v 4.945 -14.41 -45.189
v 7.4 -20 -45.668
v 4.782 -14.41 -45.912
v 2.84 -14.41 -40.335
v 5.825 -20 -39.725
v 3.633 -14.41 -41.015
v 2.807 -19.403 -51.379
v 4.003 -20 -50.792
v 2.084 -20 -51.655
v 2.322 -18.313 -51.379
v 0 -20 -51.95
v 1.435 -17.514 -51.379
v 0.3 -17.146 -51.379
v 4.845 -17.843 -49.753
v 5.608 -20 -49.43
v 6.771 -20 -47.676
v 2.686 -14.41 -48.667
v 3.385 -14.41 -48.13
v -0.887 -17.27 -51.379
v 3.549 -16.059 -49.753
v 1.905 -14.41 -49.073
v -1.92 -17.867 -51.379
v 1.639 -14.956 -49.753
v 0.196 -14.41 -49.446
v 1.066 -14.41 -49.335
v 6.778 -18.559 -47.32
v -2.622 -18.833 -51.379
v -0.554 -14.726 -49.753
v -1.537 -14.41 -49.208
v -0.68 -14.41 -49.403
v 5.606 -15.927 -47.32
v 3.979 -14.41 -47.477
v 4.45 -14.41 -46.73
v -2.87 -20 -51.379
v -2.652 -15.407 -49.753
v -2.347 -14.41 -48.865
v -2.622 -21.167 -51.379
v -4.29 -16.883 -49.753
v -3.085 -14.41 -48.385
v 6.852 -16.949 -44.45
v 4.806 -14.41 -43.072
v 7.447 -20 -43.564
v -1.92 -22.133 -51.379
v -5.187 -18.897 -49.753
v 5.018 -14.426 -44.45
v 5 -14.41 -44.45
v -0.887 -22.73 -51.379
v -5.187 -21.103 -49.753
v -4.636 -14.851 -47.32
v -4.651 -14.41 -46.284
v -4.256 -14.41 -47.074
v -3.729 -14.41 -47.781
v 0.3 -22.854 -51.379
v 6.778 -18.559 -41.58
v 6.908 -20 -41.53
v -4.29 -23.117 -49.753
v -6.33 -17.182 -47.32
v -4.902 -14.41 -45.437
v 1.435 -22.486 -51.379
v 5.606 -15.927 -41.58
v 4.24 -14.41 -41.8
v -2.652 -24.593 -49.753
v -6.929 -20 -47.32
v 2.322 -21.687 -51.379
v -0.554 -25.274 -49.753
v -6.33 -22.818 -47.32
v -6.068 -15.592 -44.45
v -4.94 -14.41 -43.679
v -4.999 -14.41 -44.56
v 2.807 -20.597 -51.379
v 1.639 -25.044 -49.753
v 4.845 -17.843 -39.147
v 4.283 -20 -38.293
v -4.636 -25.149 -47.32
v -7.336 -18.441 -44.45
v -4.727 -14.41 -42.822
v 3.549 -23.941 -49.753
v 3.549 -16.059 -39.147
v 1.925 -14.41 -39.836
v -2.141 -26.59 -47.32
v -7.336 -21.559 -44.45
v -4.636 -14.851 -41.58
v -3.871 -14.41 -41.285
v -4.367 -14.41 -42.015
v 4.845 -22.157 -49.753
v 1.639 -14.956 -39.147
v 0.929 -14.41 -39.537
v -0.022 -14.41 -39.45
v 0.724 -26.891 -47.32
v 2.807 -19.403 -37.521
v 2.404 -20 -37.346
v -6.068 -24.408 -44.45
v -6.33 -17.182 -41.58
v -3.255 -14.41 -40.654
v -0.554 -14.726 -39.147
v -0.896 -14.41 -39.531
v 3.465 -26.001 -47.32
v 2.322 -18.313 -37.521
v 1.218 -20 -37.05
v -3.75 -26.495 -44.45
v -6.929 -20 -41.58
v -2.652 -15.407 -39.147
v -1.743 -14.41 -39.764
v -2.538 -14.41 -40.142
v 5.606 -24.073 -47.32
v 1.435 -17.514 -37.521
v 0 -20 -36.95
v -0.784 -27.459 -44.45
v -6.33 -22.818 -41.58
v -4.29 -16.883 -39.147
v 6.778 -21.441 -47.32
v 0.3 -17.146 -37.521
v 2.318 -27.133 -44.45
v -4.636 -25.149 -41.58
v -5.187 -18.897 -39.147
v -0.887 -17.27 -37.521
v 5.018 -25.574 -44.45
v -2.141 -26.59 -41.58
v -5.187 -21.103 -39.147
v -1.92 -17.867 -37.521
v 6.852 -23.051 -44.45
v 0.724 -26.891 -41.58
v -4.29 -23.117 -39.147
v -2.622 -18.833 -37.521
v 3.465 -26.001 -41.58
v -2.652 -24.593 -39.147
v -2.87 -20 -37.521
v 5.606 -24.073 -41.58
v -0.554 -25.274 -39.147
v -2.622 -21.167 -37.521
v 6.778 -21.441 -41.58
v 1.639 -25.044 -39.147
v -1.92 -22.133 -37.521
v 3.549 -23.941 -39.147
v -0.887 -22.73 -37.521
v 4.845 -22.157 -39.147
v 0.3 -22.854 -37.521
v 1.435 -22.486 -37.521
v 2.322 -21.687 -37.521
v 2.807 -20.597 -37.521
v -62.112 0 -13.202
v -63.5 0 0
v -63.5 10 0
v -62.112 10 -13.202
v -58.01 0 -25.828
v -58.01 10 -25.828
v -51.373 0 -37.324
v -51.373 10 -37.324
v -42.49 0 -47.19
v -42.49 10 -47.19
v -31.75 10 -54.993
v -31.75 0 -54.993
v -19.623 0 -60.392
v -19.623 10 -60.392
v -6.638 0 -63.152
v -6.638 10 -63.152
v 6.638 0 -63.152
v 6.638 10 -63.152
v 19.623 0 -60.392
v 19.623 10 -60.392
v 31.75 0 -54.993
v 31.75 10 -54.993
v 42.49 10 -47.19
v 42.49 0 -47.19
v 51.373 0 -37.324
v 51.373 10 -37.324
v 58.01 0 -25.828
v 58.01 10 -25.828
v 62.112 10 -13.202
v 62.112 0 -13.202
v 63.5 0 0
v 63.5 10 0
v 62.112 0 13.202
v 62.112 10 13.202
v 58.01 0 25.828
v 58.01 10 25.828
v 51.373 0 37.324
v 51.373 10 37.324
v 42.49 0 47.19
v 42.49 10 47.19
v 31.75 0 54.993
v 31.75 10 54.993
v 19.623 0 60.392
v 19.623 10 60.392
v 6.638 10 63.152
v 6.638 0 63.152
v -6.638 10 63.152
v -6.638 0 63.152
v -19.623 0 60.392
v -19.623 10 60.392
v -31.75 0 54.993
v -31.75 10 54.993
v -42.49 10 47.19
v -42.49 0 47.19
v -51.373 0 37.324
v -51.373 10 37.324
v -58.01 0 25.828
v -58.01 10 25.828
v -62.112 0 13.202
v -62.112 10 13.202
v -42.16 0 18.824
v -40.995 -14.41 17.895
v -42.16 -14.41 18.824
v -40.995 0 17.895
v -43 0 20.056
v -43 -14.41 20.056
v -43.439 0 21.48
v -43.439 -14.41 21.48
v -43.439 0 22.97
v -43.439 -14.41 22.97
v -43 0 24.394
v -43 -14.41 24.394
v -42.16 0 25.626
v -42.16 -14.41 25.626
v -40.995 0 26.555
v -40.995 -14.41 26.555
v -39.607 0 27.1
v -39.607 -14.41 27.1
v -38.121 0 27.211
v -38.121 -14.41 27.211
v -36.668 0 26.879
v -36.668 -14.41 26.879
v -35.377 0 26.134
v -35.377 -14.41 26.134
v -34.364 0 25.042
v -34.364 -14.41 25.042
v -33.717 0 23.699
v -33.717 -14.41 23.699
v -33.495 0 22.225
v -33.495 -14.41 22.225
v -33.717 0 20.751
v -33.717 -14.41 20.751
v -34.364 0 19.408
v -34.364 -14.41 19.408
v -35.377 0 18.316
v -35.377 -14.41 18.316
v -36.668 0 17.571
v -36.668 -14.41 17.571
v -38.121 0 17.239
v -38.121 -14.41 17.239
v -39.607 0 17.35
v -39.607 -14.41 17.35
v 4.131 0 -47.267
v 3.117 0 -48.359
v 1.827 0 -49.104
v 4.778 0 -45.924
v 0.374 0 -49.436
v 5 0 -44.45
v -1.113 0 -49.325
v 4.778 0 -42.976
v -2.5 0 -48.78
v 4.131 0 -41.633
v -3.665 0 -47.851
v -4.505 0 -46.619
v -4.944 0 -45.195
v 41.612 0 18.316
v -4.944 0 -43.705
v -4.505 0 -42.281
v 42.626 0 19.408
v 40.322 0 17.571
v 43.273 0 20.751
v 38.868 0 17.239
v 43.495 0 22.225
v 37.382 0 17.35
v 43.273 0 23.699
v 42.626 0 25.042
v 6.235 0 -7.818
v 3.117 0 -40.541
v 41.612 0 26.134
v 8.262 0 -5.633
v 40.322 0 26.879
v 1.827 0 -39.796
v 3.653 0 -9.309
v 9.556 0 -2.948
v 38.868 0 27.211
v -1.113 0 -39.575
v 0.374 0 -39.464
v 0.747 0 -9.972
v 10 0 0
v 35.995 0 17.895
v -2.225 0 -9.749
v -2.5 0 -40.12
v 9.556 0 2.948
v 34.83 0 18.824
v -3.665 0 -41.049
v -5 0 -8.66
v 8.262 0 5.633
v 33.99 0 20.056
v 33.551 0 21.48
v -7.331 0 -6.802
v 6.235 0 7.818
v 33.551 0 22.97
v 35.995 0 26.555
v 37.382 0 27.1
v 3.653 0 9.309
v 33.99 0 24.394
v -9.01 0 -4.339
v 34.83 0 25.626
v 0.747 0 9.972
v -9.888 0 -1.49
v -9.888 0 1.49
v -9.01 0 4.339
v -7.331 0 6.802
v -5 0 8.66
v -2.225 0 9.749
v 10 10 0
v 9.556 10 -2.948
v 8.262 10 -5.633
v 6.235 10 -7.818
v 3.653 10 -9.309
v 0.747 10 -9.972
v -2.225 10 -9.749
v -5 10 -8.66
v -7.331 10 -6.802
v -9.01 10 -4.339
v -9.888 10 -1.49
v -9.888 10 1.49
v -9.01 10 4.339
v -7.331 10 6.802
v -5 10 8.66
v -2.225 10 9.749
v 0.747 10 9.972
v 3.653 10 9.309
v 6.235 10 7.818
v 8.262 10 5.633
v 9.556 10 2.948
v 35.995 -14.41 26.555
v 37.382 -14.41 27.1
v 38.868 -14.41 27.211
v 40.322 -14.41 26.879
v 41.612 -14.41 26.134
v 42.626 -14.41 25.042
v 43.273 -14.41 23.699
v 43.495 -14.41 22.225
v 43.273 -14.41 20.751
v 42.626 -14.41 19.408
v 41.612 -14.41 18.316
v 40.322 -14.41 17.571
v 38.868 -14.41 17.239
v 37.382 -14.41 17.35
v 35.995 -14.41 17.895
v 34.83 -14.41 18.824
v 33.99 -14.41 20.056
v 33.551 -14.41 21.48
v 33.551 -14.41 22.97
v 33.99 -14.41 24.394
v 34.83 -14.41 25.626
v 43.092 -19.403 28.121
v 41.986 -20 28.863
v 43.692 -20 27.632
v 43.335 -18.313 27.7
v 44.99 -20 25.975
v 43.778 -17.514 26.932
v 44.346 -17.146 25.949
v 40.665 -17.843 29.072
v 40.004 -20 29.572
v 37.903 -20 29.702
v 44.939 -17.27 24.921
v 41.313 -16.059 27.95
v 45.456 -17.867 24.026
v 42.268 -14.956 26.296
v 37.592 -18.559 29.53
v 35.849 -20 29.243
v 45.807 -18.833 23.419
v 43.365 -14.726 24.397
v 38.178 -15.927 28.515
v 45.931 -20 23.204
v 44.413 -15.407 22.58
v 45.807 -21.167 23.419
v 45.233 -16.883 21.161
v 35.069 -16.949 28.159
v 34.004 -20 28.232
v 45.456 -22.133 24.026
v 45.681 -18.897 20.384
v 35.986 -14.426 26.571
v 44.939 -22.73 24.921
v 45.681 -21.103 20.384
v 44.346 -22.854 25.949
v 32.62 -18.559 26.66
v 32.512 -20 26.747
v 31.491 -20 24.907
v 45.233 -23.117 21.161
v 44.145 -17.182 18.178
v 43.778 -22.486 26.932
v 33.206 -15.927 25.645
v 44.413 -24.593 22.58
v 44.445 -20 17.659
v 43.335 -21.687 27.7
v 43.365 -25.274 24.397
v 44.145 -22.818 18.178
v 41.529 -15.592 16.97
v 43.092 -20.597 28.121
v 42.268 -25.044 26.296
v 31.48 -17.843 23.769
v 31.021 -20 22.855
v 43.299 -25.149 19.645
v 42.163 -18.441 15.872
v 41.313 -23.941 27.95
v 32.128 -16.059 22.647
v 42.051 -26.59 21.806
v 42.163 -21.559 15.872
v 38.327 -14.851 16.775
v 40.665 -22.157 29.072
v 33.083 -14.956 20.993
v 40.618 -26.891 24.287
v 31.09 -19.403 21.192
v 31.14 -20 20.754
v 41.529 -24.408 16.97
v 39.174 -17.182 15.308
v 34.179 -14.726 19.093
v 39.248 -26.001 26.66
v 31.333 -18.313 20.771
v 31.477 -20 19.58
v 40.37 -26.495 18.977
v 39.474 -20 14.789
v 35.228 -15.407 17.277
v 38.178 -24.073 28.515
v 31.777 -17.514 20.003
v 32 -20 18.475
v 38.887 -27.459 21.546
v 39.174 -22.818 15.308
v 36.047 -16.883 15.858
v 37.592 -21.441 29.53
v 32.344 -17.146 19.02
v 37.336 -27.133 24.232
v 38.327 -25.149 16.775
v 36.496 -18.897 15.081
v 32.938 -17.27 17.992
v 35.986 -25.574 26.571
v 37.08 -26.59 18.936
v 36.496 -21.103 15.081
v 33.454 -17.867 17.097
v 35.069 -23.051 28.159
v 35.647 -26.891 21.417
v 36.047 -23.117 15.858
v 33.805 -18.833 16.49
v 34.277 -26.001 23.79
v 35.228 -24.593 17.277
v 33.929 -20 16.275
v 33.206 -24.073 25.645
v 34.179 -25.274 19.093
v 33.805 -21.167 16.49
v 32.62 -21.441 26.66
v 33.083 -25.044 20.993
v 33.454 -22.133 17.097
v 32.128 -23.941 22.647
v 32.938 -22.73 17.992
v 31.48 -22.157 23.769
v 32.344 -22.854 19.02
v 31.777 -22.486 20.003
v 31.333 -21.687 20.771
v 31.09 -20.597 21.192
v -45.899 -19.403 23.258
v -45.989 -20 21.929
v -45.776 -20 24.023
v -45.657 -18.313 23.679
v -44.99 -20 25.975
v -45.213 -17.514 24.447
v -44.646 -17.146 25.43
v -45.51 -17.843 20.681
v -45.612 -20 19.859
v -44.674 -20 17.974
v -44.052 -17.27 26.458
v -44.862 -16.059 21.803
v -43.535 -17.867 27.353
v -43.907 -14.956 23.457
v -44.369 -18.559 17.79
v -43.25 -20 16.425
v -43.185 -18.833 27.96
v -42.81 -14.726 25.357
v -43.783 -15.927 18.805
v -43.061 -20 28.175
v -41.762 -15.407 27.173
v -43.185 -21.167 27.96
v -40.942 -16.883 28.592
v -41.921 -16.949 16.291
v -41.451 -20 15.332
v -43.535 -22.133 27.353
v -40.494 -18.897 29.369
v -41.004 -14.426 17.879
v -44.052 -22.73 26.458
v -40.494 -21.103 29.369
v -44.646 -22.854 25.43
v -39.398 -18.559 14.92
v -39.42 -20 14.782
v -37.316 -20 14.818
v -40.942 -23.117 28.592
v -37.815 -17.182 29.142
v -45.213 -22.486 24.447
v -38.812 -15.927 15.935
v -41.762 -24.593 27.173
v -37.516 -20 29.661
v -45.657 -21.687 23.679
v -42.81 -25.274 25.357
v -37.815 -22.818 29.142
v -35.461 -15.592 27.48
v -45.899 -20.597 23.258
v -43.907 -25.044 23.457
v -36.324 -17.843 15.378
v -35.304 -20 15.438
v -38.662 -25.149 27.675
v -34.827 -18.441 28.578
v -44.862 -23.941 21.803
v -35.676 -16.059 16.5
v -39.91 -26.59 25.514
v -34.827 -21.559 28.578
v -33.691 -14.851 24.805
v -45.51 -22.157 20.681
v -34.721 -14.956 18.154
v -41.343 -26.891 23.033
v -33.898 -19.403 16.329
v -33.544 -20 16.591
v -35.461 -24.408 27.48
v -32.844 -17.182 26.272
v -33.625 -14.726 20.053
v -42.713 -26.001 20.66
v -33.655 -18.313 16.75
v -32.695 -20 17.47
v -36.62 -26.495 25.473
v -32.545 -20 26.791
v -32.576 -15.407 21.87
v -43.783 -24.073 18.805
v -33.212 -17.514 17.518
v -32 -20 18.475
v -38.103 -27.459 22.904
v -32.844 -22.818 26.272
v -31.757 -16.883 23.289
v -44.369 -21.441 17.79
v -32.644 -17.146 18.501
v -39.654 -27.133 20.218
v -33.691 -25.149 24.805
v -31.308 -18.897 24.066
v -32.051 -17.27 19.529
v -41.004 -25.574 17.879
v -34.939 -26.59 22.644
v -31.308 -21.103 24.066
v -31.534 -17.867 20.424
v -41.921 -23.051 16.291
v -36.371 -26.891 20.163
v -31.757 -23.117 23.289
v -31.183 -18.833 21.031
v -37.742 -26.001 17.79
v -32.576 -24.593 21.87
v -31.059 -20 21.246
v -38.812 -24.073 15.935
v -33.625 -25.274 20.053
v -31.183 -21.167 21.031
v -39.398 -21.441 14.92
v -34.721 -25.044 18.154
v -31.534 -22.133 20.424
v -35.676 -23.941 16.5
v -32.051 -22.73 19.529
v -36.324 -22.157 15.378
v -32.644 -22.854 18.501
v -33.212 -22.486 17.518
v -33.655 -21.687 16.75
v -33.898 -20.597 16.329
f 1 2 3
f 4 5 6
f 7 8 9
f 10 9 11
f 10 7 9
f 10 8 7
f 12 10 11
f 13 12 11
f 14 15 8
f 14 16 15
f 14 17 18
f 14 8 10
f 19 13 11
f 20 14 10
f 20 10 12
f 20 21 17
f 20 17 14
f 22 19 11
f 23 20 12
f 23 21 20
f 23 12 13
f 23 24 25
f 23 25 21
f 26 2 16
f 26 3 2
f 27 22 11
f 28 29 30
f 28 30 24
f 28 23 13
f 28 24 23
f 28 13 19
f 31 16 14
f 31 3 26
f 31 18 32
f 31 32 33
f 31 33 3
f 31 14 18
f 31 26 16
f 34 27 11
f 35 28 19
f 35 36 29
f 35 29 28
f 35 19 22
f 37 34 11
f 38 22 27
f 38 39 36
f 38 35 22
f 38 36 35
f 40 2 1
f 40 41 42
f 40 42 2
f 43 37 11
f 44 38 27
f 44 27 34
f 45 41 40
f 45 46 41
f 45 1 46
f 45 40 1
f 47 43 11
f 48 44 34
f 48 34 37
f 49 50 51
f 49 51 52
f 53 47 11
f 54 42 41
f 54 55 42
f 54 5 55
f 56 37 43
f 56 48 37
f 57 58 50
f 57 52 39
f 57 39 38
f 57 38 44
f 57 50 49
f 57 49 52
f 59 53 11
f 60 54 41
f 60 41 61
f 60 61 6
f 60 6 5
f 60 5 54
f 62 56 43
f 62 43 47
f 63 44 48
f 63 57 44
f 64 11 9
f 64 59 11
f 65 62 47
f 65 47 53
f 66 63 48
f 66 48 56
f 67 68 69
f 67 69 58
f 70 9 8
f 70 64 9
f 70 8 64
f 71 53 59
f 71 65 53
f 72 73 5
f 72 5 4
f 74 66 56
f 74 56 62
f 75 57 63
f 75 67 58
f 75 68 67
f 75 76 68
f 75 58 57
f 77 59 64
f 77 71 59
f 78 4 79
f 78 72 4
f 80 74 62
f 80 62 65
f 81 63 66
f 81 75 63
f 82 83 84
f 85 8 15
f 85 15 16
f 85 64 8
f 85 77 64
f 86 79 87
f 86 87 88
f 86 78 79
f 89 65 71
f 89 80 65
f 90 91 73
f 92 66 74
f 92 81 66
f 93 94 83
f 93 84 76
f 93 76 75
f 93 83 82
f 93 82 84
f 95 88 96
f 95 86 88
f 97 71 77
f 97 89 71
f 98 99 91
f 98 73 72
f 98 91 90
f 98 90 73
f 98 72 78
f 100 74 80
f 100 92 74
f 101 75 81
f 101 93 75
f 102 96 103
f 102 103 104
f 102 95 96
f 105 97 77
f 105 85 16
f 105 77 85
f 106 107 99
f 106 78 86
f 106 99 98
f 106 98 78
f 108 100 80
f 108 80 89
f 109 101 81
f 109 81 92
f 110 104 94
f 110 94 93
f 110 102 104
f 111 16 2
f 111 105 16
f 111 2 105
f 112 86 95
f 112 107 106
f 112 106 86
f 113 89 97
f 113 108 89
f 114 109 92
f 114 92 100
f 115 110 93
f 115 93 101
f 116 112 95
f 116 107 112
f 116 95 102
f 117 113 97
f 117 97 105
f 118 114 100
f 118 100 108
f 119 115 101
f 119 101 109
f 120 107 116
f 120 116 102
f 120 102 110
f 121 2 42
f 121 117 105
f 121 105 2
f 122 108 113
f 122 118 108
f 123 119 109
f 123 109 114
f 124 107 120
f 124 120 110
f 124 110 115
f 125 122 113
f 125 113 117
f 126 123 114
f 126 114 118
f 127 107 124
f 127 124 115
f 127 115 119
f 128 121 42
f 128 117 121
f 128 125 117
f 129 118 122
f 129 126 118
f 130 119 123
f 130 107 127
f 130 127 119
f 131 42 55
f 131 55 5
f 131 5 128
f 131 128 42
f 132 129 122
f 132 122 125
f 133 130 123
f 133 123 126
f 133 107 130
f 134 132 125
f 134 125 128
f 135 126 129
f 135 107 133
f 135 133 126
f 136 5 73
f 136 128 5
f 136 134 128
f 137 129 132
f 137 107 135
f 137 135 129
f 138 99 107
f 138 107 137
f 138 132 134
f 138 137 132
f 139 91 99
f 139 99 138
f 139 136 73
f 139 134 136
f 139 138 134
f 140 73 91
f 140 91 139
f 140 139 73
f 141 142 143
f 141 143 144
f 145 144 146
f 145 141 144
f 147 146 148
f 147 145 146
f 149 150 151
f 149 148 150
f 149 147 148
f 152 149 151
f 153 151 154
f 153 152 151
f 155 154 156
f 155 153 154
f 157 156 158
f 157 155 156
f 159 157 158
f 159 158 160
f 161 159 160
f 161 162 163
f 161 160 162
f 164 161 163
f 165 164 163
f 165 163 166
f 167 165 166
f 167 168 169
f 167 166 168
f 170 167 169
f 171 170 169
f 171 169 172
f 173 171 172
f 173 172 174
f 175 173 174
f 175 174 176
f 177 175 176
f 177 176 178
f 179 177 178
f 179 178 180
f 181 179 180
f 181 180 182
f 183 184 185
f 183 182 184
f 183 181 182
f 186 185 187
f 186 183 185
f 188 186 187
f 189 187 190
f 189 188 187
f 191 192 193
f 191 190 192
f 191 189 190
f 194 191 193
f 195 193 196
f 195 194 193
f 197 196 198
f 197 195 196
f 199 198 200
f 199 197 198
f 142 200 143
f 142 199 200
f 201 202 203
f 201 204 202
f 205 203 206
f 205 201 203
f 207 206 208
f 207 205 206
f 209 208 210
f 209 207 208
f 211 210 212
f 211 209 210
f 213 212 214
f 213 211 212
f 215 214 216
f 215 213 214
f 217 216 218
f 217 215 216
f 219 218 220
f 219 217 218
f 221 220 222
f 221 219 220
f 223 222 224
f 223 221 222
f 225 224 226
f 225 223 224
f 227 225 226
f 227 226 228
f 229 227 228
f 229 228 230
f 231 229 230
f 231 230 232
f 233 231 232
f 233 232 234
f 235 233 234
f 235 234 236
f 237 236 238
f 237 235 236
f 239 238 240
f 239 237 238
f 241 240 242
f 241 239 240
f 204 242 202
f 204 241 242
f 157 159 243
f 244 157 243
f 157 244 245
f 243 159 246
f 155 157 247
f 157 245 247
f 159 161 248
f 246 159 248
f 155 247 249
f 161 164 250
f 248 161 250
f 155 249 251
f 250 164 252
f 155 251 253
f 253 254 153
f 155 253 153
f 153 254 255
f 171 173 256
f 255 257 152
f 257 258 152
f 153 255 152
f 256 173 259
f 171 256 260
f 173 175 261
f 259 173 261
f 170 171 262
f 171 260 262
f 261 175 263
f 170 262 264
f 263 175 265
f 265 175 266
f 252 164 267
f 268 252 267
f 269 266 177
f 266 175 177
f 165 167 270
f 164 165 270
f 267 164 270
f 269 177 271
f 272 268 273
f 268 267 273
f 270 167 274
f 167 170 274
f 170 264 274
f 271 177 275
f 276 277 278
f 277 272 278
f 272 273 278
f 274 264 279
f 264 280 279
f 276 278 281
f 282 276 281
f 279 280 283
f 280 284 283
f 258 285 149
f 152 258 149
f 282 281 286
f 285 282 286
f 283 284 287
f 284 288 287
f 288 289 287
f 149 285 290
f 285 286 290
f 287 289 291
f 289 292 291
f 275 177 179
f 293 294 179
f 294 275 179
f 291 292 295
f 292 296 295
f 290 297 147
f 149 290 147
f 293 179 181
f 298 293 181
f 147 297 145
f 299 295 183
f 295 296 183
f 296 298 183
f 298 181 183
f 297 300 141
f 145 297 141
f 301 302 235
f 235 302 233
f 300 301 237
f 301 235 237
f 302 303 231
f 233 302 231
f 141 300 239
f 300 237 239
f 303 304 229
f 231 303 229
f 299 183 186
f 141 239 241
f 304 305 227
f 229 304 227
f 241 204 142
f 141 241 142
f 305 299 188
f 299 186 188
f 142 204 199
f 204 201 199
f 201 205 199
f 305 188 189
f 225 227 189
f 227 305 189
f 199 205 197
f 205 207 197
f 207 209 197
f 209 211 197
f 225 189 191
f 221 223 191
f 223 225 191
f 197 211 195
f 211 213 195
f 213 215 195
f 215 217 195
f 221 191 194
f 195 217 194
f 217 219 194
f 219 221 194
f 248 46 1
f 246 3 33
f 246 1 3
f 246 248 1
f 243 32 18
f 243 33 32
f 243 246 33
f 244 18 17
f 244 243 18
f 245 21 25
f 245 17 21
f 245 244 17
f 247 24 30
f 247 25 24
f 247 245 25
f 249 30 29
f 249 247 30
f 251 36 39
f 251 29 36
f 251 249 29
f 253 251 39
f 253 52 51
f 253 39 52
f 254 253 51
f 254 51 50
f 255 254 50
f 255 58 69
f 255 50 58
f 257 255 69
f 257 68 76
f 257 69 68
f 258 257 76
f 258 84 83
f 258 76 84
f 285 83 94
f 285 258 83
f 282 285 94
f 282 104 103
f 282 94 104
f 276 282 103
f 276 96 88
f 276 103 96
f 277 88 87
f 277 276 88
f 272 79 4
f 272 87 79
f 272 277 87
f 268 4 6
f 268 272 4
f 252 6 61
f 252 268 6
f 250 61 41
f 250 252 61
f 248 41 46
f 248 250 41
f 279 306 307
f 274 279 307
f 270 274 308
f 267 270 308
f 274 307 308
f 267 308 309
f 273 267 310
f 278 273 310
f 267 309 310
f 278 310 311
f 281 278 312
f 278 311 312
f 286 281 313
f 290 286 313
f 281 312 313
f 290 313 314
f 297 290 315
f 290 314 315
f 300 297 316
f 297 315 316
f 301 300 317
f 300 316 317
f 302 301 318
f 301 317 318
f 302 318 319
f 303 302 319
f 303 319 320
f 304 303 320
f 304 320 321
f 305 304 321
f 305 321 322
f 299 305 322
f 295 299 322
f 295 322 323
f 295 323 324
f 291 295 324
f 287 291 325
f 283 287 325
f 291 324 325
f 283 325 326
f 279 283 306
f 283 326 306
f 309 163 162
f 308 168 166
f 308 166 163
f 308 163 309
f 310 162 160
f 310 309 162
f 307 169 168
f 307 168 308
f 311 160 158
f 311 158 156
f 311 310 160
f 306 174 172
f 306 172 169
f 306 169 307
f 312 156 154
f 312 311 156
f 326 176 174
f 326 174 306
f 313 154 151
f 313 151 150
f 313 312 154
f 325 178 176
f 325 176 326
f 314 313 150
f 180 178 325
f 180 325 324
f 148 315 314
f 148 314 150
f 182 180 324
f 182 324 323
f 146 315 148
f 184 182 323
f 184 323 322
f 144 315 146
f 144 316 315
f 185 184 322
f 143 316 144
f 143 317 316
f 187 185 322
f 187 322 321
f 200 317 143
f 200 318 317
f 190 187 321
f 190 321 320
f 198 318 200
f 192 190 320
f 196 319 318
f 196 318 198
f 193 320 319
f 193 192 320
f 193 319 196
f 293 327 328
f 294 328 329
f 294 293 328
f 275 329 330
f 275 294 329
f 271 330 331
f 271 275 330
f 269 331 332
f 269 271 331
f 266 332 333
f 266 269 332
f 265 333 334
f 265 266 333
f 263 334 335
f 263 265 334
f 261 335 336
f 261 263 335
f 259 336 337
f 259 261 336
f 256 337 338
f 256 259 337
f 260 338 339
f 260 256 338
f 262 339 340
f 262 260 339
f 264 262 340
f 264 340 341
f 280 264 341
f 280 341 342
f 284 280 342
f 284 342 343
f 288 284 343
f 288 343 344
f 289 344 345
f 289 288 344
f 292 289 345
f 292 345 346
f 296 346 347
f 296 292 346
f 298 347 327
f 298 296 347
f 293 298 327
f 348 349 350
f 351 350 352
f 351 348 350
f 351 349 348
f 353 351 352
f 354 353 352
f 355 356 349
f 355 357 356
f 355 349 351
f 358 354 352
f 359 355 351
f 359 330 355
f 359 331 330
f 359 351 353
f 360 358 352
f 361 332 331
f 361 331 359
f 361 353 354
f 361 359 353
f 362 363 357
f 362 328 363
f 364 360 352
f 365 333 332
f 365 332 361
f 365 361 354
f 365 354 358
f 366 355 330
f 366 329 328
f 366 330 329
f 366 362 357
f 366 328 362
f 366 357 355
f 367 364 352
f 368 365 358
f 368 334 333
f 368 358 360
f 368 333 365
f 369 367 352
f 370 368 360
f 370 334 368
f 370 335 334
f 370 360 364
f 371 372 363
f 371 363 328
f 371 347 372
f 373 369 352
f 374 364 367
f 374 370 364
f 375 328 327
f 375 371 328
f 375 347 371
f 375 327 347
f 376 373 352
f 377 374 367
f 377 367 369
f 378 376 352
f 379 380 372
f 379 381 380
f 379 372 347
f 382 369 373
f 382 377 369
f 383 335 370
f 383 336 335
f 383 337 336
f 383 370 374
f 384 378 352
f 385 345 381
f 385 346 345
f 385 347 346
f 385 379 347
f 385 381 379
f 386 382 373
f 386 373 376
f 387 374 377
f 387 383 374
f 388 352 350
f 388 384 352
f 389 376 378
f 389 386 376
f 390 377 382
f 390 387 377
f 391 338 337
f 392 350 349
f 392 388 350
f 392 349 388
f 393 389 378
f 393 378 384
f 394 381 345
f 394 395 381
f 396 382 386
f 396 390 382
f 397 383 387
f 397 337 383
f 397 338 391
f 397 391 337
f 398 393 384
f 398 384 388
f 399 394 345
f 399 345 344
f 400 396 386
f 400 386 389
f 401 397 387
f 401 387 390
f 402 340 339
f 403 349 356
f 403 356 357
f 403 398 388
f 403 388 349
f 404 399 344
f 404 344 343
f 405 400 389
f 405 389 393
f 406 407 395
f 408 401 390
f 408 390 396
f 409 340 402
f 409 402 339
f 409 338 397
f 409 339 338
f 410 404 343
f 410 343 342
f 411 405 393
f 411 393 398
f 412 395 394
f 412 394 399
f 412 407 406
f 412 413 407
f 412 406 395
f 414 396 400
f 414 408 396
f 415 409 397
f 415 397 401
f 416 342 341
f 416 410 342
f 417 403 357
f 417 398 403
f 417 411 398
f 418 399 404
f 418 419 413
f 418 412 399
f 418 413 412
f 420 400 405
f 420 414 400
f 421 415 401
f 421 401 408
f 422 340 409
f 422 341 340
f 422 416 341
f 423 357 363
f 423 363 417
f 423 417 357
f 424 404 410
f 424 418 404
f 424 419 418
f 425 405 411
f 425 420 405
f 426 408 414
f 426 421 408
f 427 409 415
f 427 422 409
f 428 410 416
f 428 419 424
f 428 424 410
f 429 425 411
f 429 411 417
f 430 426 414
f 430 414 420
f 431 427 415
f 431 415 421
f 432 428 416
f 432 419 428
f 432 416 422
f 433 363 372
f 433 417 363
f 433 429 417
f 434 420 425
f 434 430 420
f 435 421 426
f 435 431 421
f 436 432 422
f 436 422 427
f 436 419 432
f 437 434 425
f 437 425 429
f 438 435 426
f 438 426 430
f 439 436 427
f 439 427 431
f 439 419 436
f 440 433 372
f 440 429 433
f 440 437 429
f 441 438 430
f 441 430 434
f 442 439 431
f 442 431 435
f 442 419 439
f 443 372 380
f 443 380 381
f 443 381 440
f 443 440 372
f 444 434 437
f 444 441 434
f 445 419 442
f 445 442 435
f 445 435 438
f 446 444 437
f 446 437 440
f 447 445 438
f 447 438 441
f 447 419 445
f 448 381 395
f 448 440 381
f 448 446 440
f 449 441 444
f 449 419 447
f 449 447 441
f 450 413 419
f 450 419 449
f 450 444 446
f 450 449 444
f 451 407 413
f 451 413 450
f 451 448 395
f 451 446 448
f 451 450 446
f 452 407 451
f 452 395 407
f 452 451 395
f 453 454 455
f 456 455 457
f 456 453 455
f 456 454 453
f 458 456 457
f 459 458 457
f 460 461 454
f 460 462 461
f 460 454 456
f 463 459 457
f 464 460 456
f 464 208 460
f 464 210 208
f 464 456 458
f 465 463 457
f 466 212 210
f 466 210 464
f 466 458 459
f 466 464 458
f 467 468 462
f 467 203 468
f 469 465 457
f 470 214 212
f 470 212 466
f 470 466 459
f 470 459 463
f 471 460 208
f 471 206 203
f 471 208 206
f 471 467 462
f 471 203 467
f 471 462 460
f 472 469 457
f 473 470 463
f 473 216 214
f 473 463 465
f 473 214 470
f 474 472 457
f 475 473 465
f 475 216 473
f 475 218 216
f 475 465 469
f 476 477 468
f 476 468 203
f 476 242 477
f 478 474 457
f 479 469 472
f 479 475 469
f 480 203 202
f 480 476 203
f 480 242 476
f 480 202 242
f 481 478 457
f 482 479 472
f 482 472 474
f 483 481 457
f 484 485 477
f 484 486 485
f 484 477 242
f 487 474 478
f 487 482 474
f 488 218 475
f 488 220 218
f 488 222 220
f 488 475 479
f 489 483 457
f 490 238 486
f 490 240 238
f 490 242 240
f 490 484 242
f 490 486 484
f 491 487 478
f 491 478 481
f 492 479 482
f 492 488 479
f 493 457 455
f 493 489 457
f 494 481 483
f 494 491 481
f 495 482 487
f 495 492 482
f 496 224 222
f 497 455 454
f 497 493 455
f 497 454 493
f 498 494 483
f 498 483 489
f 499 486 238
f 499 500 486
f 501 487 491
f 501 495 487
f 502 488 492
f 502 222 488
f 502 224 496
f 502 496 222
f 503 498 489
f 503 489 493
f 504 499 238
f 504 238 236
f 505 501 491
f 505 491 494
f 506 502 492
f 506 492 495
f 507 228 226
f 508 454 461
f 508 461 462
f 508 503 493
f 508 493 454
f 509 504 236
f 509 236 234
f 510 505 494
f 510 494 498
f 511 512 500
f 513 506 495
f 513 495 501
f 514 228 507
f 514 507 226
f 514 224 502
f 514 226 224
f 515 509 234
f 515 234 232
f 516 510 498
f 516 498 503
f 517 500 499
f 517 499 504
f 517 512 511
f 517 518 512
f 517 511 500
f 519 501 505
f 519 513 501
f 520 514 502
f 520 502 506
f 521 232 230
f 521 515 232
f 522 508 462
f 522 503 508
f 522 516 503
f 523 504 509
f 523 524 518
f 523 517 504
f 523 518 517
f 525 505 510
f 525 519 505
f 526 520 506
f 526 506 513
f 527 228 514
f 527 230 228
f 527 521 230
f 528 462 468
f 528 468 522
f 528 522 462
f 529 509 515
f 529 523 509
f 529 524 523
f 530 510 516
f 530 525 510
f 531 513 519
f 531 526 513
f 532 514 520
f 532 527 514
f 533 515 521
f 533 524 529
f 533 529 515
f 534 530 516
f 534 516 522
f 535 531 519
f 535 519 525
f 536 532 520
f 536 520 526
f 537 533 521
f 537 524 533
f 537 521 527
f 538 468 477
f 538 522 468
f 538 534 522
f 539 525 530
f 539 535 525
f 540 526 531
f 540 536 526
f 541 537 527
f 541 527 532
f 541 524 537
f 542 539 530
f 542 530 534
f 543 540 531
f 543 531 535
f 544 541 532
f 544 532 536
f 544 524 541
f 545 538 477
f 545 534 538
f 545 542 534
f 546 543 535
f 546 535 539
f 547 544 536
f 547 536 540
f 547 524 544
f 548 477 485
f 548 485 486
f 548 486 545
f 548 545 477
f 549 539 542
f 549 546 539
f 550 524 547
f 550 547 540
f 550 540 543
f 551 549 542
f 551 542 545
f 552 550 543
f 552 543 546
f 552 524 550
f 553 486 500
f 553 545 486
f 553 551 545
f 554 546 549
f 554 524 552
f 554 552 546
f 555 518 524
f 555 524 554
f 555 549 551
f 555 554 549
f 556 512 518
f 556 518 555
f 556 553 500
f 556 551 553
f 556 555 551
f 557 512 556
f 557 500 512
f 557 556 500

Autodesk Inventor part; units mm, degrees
ref_plane "YZ Plane" through (0, 0, 0) normal (1, 0, 0) x (0, 1, 0)
ref_plane "XZ Plane" through (0, 0, 0) normal (0, 1, 0) x (-1, 0, 0)
ref_plane "XY Plane" through (0, 0, 0) normal (0, 0, 1) x (1, 0, 0)
sketch "Sketch1" plane through (0, 0, 0) normal (0, 1, 0) x (-1, 0, 0)
  circle A0 centre (0, 0) radius 63.5
  dimension "d0" = 127
extrude "Extrusion1" add sketch "Sketch1" along normal blind 10
sketch "Sketch2" plane through (0, 0, 0) normal (0, -1, 0) x (1, 0, 0)
  circle A0 centre (0, -44.45) radius 5
  line L0 (0, 0) -> (0, -44.45)
  dimension "d3" = 44.45
  dimension "d4" = 10
extrude "Extrusion2" add sketch "Sketch2" along normal blind 20
sketch "Sketch3" plane through (0, -20, -44.45) normal (0, -1, 0) x (1, 0, 0)
  circle A0 centre (0, 0) radius 5 projected
  arc A1 (0, -7.5) -> (0, 7.5) centre (0, 0) ccw
  line L0 (0, 0) -> (0, -7.5)
  line L1 (0, 0) -> (0, 7.5)
  point P0 (0, 44.45)
  dimension "d7" = 7.5
revolve "Revolution1" add sketch "Sketch3" angle 360 about axis through (0, -20, -44.45) along (0, 0, -1) picked at (1.094, -3.1265) contours A0 L0 L1 | A0 L1 A1 L0
pattern_circular "Circular Pattern1" count 3 over 360 about axis through (0, -10, 0) along (0, 1, 0) of "Extrusion2", "Revolution1"
sketch "Sketch4" plane through (0, 10, 0) normal (0, 1, 0) x (1, 0, 0)
  circle A0 centre (0, 0) radius 10
  dimension "d12" = 20
extrude "Extrusion3" cut sketch "Sketch4" against normal up to surface (10 mm away)
properties part number "pll-base"
